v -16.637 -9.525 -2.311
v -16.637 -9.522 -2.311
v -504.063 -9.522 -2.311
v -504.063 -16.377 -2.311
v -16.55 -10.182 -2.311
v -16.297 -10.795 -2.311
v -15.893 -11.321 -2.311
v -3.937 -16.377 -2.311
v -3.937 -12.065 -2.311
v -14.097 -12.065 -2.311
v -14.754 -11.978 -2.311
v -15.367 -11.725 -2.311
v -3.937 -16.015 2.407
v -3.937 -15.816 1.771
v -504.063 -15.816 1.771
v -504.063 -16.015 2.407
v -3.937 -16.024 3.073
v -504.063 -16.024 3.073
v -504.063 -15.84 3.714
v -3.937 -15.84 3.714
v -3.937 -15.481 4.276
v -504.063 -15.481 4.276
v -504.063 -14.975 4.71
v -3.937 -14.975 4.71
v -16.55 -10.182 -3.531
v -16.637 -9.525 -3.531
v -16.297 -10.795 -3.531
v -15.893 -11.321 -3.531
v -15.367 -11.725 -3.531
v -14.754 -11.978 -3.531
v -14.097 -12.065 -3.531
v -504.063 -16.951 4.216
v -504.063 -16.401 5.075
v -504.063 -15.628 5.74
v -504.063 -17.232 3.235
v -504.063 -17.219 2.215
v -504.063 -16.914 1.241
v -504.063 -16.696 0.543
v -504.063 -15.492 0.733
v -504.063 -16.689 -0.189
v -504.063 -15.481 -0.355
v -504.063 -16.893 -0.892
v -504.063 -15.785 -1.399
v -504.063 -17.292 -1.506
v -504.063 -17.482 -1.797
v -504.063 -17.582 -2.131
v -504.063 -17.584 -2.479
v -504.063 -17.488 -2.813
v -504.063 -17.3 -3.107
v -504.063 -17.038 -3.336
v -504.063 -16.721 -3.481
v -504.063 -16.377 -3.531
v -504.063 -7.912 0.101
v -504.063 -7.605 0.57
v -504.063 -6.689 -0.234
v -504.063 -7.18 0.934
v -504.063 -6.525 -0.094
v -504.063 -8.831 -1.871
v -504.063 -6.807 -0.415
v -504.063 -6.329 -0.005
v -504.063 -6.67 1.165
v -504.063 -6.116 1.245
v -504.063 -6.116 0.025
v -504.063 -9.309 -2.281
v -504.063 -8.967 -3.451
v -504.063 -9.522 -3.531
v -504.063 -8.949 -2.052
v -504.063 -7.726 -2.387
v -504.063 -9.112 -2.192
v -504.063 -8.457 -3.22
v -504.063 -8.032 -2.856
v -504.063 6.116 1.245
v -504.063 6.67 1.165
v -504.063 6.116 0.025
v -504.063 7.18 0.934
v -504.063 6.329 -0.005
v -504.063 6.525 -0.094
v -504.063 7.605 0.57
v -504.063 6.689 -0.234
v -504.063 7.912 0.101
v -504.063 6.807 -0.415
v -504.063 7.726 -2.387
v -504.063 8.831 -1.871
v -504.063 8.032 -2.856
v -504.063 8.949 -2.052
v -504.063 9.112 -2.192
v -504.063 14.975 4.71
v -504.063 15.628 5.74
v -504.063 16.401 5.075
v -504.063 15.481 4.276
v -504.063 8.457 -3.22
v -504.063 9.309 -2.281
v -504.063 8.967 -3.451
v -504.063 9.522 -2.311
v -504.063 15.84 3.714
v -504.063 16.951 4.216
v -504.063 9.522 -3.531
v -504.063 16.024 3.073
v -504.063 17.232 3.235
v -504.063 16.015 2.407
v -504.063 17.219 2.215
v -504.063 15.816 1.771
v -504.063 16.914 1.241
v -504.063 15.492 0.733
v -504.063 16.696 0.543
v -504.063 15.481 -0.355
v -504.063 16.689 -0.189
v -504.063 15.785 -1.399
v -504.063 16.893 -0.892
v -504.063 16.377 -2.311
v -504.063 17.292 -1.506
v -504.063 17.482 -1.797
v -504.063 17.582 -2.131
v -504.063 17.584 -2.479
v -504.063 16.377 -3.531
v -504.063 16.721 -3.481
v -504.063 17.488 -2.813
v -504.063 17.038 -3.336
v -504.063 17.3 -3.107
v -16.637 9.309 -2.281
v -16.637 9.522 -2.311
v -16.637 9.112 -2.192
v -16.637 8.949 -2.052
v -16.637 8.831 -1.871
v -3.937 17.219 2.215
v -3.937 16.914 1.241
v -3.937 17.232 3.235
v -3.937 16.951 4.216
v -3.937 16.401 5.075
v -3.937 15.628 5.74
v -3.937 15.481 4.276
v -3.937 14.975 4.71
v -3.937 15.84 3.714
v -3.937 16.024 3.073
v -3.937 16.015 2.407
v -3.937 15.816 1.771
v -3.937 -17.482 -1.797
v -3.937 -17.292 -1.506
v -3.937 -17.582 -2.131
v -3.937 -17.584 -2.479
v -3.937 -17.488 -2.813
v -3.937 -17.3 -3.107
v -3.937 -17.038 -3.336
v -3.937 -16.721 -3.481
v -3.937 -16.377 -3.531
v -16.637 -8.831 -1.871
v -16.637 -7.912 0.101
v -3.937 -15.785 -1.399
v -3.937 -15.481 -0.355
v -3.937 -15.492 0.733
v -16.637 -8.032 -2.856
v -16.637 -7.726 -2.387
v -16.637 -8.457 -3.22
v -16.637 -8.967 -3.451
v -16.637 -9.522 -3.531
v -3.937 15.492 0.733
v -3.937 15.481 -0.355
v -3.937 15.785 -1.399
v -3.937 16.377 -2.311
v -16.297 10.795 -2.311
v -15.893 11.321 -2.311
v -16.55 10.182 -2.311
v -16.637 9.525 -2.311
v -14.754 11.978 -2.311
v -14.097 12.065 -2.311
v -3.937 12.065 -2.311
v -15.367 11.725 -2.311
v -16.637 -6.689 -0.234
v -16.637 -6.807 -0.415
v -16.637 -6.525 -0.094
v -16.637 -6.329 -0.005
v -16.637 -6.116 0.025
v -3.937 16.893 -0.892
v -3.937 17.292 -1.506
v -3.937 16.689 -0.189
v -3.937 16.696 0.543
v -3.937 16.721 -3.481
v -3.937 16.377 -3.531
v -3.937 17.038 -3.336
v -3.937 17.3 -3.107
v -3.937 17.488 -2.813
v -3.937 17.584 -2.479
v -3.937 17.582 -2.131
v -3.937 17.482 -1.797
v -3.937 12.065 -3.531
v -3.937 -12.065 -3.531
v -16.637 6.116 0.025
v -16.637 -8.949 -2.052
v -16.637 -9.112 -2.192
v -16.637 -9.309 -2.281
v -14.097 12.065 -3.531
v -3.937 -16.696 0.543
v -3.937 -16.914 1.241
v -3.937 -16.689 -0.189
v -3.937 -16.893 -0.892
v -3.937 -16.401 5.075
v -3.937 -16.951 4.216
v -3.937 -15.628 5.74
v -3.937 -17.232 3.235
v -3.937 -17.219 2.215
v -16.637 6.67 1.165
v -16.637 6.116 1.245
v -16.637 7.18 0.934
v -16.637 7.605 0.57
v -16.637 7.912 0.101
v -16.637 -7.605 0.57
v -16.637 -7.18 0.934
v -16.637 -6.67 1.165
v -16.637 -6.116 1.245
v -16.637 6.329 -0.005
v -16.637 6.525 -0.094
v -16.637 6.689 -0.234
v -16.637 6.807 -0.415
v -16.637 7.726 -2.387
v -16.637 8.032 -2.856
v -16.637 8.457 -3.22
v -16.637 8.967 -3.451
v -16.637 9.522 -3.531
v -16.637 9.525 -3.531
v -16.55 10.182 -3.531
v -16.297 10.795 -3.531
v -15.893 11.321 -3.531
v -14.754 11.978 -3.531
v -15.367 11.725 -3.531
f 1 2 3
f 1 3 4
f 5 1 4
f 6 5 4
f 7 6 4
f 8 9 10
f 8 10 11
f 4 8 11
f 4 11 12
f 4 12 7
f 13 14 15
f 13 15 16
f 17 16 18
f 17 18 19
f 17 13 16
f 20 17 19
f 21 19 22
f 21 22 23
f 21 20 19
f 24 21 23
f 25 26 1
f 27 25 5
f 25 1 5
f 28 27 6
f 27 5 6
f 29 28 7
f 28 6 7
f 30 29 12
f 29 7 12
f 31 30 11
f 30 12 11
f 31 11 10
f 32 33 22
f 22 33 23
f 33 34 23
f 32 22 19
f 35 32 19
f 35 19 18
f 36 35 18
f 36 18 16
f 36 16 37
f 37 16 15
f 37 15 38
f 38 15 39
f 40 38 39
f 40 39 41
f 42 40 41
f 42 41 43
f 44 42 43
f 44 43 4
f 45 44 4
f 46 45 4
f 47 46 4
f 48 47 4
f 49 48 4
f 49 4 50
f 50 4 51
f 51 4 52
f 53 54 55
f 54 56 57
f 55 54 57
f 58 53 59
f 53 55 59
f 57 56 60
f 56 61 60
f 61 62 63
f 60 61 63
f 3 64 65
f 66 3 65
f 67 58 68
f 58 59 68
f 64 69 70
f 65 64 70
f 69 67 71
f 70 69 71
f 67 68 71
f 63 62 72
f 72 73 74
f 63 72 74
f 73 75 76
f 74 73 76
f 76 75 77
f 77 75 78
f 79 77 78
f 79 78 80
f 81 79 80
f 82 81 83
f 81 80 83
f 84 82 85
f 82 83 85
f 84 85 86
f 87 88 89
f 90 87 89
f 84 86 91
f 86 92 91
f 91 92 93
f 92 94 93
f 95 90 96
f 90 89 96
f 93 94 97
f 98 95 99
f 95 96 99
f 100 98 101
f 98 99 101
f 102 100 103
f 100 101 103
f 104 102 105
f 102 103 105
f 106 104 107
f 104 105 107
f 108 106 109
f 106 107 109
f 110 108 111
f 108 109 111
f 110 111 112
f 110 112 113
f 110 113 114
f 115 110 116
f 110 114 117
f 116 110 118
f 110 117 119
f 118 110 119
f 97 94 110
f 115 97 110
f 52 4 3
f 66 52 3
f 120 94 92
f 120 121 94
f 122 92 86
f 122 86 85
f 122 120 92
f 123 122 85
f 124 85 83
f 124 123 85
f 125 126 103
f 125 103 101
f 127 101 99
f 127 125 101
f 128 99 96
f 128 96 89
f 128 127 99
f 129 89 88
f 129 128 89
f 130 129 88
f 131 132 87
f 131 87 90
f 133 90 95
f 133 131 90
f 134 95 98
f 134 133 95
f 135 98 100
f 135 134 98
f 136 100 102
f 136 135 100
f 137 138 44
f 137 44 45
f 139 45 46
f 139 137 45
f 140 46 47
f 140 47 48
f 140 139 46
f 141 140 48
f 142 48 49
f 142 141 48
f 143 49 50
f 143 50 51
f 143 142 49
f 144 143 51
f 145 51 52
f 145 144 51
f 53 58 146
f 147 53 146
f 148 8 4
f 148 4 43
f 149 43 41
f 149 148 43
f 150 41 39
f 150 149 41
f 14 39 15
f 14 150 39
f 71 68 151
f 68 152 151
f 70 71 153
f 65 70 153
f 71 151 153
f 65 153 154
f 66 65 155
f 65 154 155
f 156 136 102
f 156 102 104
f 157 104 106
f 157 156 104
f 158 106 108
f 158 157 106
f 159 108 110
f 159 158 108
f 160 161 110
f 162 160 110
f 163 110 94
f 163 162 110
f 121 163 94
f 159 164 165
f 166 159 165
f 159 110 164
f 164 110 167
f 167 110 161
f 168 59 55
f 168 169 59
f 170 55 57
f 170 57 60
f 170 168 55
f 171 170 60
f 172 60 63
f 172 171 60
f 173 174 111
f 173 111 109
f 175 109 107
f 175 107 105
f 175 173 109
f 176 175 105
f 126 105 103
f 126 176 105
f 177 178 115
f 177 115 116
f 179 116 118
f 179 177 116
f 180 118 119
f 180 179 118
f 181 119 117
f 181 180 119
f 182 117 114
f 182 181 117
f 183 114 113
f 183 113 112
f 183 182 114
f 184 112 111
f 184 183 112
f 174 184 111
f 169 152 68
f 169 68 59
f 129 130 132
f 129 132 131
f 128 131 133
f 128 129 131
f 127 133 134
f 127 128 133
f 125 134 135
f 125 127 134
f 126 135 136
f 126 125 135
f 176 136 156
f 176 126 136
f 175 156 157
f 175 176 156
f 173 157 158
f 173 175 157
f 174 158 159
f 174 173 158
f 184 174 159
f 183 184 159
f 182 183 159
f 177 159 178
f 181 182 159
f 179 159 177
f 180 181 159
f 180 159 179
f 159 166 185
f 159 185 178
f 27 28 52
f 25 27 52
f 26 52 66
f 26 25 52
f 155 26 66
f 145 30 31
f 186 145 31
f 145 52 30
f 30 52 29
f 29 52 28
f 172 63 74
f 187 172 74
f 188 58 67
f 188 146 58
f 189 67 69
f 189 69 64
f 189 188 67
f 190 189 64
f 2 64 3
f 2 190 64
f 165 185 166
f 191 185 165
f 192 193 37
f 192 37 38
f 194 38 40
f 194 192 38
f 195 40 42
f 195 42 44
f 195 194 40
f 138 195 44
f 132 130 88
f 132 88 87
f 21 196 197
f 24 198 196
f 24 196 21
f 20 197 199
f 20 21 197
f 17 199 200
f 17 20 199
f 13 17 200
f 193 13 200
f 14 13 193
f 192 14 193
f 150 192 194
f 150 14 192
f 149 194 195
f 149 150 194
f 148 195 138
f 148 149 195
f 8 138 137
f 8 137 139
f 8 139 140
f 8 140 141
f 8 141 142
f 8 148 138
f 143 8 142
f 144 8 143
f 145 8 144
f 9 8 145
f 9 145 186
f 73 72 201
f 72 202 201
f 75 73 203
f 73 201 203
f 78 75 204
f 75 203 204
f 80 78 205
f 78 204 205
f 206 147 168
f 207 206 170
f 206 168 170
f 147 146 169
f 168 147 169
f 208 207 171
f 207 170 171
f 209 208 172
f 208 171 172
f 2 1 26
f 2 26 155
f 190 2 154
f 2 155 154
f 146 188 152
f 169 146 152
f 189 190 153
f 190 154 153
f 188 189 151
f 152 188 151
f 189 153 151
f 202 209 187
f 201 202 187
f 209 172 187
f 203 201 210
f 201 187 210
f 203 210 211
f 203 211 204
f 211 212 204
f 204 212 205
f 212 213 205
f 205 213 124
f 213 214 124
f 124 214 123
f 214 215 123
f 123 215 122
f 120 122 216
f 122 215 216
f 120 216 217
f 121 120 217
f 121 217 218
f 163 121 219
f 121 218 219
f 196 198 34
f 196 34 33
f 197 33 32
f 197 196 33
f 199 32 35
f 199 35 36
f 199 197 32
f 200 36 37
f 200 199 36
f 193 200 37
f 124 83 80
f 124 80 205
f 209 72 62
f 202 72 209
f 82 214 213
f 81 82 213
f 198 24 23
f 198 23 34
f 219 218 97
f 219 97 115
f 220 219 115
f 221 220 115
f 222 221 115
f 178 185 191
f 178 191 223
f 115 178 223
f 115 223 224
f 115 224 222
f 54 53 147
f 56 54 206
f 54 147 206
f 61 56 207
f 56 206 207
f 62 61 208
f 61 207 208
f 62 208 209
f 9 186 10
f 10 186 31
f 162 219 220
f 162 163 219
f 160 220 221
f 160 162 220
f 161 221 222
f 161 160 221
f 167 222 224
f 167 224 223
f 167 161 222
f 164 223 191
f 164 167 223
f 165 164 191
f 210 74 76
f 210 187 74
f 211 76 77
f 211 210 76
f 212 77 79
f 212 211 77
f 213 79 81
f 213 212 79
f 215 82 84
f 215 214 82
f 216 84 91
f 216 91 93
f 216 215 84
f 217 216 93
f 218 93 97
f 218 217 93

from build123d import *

# Parameters (mm, degrees)
BOSS_EXTRUDE1_DEPTH = 500.126
SKETCH2_W           = 12.7
SKETCH2_H           = 24.13
CUT_EXTRUDE1_DEPTH  = 505.455221633
SKETCH3_W           = 487.426
SKETCH3_H           = 14.75620072
BOSS_EXTRUDE2_DEPTH = 3.55599999
SKETCH4_W           = 3.55599999
SKETCH4_H           = 13.202768596
CUT_EXTRUDE2_DEPTH  = 501.46835993
DRAFT1_ANGLE        = 25
DRAFT2_ANGLE        = 25
FILLET1_R           = 0.76200009
FILLET2_R           = 1.98120009
FILLET3_R           = 2.54


with BuildPart() as part:
    # Sketch1 → Boss-Extrude1 (new body)
    with BuildSketch(Plane(origin=(-3.937, 0, 0), x_dir=(0, 0, -1), z_dir=(1, 0, 0))):
        with BuildLine():
            Line((2.311399989, 16.37657286), (2.311399989, -16.37657286))
            ThreePointArc((2.311399989, -16.37657286), (0.354826715, -15.481038557), (-1.770730805, -15.815950332))
            ThreePointArc((-1.770730805, -15.815950332), (-3.400639082, -15.955235788), (-4.710462095, -14.975253591))
            Line((-4.710462095, -14.975253591), (-5.7404, -15.627692517))
            ThreePointArc((-5.7404, -15.627692517), (-3.73586423, -17.127444277), (-1.241474216, -16.914283663))
            ThreePointArc((-1.241474216, -16.914283663), (0.188944014, -16.688900954), (1.505642365, -17.291560998))
            ThreePointArc((1.505642365, -17.291560998), (2.81343034, -17.487614789), (3.53059999, -16.37657286))
            Line((3.53059999, -16.37657286), (3.53059999, 16.37657286))
            ThreePointArc((3.53059999, 16.37657286), (2.81343034, 17.487614789), (1.505642365, 17.291560998))
            ThreePointArc((1.505642365, 17.291560998), (0.188944014, 16.688900954), (-1.241474216, 16.914283663))
            ThreePointArc((-1.241474216, 16.914283663), (-3.73586423, 17.127444277), (-5.7404, 15.627692517))
            Line((-5.7404, 15.627692517), (-4.710462095, 14.975253591))
            ThreePointArc((-4.710462095, 14.975253591), (-3.400639082, 15.955235788), (-1.770730805, 15.815950332))
            ThreePointArc((-1.770730805, 15.815950332), (0.354826715, 15.481038557), (2.311399989, 16.37657286))
        make_face()
    extrude(amount=-BOSS_EXTRUDE1_DEPTH)

    # Sketch2 → Cut-Extrude1 (cut, through all)
    with BuildSketch(Plane(origin=(0, 0, -3.53059999), x_dir=(-1, 0, 0), z_dir=(0, 0, -1))):
        with Locations((10.287, 0)):
            Rectangle(SKETCH2_W, SKETCH2_H)
    extrude(amount=-CUT_EXTRUDE1_DEPTH, mode=Mode.SUBTRACT)

    # Sketch3 → Boss-Extrude2 (add)
    with BuildSketch(Plane.XY.offset(-2.311399989)):
        with Locations((-260.35, 0)):
            Rectangle(SKETCH3_W, SKETCH3_H)
    extrude(amount=BOSS_EXTRUDE2_DEPTH)

    # Sketch4 → Cut-Extrude2 (cut, through all)
    with BuildSketch(Plane.ZY.offset(504.063)):
        with Locations((-1.752599995, 0)):
            Rectangle(SKETCH4_W, SKETCH4_H)
    extrude(amount=-CUT_EXTRUDE2_DEPTH, mode=Mode.SUBTRACT)

    # Draft1
    draft1_faces = [part.faces().sort_by_distance(p)[0] for p in [
        (-260.35, 7.37810036, -0.533399994),
        (-260.35, -7.37810036, -0.533399994),
    ]]
    draft(draft1_faces, Plane.XY.offset(1.244600001), DRAFT1_ANGLE)

    # Draft2
    draft2_faces = [part.faces().sort_by_distance(p)[0] for p in [
        (-260.35, 6.601384298, -1.752599995),
        (-260.35, -6.601384298, -1.752599995),
    ]]
    draft(draft2_faces, Plane(origin=(-3.937, -6.601384298, 0.0254), x_dir=(0, -1, 0), z_dir=(0, 0, -1)), DRAFT2_ANGLE)

    # Fillet1
    fillet1_edges = [part.edges().sort_by_distance(p)[0] for p in [
        (-260.35, -9.036290388, -2.311399989),
        (-260.35, 9.036290388, -2.311399989),
        (-260.35, 6.601384298, 0.0254),
        (-260.35, -6.601384298, 0.0254),
    ]]
    fillet(fillet1_edges, radius=FILLET1_R)

    # Fillet2
    fillet2_edges = [part.edges().sort_by_distance(p)[0] for p in [
        (-260.35, -7.37810036, 1.244600001),
        (-260.35, 7.37810036, 1.244600001),
        (-260.35, 8.259574326, -3.53059999),
        (-260.35, -8.259574326, -3.53059999),
    ]]
    fillet(fillet2_edges, radius=FILLET2_R)

    # Fillet3
    fillet3_edges = [part.edges().sort_by_distance(p)[0] for p in [
        (-16.637, 12.065, -2.92099999),
        (-16.637, -12.065, -2.92099999),
    ]]
    fillet(fillet3_edges, radius=FILLET3_R)


solid = part.part
